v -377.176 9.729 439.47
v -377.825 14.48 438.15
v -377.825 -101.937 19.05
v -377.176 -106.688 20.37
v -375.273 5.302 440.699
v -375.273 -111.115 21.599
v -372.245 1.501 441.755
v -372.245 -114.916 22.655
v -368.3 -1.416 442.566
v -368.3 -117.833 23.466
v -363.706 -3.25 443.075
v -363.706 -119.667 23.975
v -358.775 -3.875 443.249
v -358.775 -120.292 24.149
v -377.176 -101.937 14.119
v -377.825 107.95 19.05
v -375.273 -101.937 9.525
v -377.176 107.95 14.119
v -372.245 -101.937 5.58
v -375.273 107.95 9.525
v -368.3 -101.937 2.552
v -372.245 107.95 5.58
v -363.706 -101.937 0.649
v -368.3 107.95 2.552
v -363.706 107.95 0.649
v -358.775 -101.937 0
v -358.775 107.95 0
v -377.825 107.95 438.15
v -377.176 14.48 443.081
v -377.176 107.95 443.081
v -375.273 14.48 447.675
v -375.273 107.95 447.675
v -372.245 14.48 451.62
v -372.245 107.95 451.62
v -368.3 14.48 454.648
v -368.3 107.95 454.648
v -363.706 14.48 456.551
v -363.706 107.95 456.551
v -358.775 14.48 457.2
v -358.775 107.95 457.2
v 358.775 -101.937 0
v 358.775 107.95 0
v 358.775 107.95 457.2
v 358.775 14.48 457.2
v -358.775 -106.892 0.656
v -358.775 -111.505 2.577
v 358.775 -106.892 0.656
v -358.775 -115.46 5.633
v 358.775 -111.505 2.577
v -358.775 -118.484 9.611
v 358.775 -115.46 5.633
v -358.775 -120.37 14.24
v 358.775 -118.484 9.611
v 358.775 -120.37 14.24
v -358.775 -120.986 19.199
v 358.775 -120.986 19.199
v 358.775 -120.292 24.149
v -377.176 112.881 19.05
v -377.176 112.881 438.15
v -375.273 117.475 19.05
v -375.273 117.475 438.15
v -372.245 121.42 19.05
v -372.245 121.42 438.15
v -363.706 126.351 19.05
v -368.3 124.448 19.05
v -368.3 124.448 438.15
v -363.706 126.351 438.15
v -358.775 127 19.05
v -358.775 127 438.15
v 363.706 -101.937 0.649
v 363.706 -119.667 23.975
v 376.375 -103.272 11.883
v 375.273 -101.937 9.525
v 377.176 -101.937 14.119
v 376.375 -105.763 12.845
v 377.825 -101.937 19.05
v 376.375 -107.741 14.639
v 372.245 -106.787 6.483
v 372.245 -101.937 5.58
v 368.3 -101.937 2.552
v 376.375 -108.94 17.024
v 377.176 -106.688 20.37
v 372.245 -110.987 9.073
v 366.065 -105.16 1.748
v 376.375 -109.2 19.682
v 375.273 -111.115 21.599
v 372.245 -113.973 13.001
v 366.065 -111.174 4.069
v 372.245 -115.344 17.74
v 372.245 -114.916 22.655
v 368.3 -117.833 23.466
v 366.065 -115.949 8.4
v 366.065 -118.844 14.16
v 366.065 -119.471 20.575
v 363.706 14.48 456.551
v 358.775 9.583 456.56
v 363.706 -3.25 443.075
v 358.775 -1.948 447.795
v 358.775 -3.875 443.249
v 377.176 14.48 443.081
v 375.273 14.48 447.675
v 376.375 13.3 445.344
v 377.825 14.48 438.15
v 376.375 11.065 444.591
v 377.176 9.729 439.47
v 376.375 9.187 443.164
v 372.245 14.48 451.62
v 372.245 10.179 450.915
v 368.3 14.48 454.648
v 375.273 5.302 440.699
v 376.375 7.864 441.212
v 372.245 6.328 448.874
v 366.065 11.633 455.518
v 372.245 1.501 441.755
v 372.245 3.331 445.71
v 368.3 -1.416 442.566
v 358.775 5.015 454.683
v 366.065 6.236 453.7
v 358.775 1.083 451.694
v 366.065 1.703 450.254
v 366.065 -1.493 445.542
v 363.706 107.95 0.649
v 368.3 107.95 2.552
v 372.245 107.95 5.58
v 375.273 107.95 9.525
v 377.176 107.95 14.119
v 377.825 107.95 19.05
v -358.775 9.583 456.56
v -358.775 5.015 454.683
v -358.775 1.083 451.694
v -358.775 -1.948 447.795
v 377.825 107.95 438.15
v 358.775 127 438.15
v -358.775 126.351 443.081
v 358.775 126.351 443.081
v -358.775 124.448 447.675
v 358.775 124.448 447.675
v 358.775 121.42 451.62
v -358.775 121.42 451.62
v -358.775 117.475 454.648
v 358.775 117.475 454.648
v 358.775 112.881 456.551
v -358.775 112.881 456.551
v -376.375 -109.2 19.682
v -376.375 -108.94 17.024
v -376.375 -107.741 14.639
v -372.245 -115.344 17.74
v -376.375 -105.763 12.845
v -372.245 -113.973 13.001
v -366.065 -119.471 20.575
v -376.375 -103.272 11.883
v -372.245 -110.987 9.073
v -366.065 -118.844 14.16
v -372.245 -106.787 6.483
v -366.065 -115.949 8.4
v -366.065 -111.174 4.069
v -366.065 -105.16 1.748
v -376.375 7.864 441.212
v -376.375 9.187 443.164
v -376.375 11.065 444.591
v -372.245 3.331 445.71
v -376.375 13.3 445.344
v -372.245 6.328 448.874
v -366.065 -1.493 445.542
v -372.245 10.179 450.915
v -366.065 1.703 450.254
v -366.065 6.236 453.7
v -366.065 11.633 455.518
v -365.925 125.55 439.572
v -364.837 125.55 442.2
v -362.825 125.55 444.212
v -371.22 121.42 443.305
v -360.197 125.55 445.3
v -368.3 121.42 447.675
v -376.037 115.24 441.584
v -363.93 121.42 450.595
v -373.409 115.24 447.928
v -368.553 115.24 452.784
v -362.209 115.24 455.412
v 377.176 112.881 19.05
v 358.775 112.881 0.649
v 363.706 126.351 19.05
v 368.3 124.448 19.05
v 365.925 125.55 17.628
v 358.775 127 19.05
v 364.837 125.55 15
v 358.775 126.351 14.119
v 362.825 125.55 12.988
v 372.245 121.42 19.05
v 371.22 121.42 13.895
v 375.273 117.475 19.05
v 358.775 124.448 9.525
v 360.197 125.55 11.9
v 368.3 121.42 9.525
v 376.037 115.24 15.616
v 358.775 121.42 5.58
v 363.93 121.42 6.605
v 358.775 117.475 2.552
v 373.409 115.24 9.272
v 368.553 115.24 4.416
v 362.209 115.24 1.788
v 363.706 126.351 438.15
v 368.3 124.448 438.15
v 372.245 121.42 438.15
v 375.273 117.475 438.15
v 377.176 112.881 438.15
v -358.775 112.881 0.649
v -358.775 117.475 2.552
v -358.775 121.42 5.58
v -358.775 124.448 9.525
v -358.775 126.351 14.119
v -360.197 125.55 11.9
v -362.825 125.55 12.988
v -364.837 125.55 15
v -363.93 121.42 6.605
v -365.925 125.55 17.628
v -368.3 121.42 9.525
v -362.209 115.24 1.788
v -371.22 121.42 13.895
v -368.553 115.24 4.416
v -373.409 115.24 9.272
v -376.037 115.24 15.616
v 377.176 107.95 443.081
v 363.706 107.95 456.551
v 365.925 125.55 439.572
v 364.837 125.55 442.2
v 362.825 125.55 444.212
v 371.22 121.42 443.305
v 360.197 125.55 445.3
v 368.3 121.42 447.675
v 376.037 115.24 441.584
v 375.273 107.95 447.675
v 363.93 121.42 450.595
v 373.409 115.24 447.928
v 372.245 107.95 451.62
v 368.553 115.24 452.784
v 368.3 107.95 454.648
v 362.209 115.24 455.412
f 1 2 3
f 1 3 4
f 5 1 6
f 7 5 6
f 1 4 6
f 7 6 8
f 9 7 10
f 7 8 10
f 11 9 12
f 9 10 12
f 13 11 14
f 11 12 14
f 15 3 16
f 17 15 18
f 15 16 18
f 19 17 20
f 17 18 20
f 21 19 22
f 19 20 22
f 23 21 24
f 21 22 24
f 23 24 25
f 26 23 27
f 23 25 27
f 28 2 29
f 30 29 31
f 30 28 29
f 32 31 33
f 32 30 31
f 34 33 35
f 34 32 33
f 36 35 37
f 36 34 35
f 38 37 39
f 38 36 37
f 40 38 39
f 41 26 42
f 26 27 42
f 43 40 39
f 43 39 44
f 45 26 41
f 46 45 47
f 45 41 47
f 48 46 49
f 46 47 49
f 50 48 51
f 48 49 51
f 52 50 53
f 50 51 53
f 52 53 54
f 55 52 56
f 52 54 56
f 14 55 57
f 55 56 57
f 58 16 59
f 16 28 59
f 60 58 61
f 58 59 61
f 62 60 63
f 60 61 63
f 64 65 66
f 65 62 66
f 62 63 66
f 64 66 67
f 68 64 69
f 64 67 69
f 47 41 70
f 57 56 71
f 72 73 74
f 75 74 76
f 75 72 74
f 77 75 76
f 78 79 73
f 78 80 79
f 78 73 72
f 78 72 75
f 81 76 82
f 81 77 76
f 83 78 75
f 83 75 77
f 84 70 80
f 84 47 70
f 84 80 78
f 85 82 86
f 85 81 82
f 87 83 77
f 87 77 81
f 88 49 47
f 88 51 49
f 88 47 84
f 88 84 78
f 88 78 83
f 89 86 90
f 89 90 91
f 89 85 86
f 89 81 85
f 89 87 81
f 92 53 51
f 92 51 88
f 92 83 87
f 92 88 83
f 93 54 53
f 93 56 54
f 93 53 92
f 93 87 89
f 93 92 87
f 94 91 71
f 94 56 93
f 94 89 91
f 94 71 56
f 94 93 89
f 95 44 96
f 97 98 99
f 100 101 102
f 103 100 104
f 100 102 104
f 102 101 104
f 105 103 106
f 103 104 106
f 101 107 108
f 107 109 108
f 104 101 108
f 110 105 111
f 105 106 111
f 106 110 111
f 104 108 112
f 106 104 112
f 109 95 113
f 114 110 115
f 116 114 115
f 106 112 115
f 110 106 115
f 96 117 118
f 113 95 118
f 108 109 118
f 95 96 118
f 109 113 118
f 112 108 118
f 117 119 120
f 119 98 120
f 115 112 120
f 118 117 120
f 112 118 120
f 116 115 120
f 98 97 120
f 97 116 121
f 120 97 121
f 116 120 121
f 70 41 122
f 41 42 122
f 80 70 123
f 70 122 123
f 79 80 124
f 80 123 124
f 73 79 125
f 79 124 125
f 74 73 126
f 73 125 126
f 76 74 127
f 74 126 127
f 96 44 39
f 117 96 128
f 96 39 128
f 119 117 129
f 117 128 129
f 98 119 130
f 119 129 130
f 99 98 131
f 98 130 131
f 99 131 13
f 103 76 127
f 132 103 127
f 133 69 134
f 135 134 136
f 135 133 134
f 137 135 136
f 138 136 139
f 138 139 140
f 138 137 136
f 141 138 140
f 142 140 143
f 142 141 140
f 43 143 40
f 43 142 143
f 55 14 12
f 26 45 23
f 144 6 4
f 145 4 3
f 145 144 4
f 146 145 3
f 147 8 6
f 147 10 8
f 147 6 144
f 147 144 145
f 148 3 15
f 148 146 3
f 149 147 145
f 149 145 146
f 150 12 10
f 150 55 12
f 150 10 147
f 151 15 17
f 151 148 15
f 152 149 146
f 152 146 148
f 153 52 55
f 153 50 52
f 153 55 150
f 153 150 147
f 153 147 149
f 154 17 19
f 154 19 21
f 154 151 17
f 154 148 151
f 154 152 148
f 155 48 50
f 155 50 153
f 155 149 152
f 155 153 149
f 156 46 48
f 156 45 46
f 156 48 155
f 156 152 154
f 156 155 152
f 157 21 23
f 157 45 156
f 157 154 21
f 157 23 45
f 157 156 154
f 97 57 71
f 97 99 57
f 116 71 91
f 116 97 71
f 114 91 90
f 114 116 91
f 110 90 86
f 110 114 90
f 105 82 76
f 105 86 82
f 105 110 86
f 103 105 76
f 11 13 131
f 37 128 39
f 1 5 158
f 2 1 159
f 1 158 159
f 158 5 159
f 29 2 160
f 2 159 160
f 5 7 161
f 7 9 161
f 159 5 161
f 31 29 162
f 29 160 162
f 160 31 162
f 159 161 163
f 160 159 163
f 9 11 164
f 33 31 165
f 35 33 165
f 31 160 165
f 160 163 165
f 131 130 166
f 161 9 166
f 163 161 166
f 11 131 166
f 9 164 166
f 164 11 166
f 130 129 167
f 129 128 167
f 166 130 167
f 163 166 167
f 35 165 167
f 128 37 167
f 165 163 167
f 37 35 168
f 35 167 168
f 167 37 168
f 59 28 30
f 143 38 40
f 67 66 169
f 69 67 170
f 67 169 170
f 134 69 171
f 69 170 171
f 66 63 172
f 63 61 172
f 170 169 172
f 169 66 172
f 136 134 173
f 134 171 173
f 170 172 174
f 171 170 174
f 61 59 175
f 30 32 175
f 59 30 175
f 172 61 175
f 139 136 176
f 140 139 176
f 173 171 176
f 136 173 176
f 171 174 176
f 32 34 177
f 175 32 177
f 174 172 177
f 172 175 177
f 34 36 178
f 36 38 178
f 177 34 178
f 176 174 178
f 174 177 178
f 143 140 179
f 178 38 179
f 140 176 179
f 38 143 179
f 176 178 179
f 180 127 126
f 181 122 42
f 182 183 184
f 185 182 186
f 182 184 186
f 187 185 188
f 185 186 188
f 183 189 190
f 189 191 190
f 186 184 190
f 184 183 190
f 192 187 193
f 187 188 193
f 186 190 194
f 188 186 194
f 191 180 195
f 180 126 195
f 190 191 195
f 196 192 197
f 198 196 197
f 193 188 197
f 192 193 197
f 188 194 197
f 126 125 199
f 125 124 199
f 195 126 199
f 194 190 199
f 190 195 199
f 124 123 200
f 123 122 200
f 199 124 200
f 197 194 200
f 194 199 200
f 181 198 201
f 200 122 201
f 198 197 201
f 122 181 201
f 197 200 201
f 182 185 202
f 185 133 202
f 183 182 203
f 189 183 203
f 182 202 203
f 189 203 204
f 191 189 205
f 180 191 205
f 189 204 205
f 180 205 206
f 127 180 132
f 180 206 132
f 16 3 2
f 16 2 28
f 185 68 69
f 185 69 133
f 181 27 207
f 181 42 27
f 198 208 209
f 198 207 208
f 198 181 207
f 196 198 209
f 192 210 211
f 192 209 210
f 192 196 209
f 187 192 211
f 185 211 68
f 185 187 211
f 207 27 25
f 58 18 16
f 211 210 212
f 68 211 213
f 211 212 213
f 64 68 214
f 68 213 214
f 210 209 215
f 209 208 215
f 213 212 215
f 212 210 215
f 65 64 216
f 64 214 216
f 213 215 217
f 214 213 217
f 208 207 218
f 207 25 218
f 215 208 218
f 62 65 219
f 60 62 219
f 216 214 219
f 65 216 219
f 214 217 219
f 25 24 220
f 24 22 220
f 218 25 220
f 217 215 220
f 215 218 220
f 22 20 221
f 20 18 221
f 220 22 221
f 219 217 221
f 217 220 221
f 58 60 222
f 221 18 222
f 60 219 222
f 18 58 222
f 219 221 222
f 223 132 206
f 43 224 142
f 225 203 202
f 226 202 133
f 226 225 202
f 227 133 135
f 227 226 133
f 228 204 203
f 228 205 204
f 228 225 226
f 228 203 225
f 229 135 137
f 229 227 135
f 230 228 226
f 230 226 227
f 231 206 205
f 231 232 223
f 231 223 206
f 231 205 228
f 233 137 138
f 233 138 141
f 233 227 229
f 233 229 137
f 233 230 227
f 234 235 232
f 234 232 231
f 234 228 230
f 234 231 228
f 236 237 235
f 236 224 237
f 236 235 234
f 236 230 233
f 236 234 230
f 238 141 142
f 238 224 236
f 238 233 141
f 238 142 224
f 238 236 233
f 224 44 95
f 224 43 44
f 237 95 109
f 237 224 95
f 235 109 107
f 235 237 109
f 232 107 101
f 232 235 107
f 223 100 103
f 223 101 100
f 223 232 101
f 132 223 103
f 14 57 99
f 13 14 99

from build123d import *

# Parameters (mm, degrees)
F0_W     = 755.65
F0_H     = 254
F1_DEPTH = 457.2
F3_DEPTH = 755.651
F4_R     = 19.05


with BuildPart() as f1:
    # F0 (on Top) → F1 (new body)
    with BuildSketch(Plane.XY):
        Rectangle(F0_W, F0_H)
    extrude(amount=F1_DEPTH)

    # F2 (on face) → F3 (cut, through all)
    with BuildSketch(Plane.YZ.offset(377.825)):
        Polygon((-127, 457.2), (-127, 0), (0, 457.2), align=None)
    extrude(amount=-F3_DEPTH, mode=Mode.SUBTRACT)

    # F4
    f4_edges = [f1.edges().sort_by_distance(p)[0] for p in [
        (0, -127, 0),
        (377.825, 0, 0),
        (377.825, -63.5, 228.6),
        (-377.825, -63.5, 228.6),
        (-377.825, 0, 0),
        (-377.825, 63.5, 457.2),
        (0, 0, 457.2),
        (377.825, 63.5, 457.2),
        (377.825, 127, 228.6),
        (0, 127, 0),
        (-377.825, 127, 228.6),
        (0, 127, 457.2),
    ]]
    fillet(f4_edges, radius=F4_R)


solid = f1.part
